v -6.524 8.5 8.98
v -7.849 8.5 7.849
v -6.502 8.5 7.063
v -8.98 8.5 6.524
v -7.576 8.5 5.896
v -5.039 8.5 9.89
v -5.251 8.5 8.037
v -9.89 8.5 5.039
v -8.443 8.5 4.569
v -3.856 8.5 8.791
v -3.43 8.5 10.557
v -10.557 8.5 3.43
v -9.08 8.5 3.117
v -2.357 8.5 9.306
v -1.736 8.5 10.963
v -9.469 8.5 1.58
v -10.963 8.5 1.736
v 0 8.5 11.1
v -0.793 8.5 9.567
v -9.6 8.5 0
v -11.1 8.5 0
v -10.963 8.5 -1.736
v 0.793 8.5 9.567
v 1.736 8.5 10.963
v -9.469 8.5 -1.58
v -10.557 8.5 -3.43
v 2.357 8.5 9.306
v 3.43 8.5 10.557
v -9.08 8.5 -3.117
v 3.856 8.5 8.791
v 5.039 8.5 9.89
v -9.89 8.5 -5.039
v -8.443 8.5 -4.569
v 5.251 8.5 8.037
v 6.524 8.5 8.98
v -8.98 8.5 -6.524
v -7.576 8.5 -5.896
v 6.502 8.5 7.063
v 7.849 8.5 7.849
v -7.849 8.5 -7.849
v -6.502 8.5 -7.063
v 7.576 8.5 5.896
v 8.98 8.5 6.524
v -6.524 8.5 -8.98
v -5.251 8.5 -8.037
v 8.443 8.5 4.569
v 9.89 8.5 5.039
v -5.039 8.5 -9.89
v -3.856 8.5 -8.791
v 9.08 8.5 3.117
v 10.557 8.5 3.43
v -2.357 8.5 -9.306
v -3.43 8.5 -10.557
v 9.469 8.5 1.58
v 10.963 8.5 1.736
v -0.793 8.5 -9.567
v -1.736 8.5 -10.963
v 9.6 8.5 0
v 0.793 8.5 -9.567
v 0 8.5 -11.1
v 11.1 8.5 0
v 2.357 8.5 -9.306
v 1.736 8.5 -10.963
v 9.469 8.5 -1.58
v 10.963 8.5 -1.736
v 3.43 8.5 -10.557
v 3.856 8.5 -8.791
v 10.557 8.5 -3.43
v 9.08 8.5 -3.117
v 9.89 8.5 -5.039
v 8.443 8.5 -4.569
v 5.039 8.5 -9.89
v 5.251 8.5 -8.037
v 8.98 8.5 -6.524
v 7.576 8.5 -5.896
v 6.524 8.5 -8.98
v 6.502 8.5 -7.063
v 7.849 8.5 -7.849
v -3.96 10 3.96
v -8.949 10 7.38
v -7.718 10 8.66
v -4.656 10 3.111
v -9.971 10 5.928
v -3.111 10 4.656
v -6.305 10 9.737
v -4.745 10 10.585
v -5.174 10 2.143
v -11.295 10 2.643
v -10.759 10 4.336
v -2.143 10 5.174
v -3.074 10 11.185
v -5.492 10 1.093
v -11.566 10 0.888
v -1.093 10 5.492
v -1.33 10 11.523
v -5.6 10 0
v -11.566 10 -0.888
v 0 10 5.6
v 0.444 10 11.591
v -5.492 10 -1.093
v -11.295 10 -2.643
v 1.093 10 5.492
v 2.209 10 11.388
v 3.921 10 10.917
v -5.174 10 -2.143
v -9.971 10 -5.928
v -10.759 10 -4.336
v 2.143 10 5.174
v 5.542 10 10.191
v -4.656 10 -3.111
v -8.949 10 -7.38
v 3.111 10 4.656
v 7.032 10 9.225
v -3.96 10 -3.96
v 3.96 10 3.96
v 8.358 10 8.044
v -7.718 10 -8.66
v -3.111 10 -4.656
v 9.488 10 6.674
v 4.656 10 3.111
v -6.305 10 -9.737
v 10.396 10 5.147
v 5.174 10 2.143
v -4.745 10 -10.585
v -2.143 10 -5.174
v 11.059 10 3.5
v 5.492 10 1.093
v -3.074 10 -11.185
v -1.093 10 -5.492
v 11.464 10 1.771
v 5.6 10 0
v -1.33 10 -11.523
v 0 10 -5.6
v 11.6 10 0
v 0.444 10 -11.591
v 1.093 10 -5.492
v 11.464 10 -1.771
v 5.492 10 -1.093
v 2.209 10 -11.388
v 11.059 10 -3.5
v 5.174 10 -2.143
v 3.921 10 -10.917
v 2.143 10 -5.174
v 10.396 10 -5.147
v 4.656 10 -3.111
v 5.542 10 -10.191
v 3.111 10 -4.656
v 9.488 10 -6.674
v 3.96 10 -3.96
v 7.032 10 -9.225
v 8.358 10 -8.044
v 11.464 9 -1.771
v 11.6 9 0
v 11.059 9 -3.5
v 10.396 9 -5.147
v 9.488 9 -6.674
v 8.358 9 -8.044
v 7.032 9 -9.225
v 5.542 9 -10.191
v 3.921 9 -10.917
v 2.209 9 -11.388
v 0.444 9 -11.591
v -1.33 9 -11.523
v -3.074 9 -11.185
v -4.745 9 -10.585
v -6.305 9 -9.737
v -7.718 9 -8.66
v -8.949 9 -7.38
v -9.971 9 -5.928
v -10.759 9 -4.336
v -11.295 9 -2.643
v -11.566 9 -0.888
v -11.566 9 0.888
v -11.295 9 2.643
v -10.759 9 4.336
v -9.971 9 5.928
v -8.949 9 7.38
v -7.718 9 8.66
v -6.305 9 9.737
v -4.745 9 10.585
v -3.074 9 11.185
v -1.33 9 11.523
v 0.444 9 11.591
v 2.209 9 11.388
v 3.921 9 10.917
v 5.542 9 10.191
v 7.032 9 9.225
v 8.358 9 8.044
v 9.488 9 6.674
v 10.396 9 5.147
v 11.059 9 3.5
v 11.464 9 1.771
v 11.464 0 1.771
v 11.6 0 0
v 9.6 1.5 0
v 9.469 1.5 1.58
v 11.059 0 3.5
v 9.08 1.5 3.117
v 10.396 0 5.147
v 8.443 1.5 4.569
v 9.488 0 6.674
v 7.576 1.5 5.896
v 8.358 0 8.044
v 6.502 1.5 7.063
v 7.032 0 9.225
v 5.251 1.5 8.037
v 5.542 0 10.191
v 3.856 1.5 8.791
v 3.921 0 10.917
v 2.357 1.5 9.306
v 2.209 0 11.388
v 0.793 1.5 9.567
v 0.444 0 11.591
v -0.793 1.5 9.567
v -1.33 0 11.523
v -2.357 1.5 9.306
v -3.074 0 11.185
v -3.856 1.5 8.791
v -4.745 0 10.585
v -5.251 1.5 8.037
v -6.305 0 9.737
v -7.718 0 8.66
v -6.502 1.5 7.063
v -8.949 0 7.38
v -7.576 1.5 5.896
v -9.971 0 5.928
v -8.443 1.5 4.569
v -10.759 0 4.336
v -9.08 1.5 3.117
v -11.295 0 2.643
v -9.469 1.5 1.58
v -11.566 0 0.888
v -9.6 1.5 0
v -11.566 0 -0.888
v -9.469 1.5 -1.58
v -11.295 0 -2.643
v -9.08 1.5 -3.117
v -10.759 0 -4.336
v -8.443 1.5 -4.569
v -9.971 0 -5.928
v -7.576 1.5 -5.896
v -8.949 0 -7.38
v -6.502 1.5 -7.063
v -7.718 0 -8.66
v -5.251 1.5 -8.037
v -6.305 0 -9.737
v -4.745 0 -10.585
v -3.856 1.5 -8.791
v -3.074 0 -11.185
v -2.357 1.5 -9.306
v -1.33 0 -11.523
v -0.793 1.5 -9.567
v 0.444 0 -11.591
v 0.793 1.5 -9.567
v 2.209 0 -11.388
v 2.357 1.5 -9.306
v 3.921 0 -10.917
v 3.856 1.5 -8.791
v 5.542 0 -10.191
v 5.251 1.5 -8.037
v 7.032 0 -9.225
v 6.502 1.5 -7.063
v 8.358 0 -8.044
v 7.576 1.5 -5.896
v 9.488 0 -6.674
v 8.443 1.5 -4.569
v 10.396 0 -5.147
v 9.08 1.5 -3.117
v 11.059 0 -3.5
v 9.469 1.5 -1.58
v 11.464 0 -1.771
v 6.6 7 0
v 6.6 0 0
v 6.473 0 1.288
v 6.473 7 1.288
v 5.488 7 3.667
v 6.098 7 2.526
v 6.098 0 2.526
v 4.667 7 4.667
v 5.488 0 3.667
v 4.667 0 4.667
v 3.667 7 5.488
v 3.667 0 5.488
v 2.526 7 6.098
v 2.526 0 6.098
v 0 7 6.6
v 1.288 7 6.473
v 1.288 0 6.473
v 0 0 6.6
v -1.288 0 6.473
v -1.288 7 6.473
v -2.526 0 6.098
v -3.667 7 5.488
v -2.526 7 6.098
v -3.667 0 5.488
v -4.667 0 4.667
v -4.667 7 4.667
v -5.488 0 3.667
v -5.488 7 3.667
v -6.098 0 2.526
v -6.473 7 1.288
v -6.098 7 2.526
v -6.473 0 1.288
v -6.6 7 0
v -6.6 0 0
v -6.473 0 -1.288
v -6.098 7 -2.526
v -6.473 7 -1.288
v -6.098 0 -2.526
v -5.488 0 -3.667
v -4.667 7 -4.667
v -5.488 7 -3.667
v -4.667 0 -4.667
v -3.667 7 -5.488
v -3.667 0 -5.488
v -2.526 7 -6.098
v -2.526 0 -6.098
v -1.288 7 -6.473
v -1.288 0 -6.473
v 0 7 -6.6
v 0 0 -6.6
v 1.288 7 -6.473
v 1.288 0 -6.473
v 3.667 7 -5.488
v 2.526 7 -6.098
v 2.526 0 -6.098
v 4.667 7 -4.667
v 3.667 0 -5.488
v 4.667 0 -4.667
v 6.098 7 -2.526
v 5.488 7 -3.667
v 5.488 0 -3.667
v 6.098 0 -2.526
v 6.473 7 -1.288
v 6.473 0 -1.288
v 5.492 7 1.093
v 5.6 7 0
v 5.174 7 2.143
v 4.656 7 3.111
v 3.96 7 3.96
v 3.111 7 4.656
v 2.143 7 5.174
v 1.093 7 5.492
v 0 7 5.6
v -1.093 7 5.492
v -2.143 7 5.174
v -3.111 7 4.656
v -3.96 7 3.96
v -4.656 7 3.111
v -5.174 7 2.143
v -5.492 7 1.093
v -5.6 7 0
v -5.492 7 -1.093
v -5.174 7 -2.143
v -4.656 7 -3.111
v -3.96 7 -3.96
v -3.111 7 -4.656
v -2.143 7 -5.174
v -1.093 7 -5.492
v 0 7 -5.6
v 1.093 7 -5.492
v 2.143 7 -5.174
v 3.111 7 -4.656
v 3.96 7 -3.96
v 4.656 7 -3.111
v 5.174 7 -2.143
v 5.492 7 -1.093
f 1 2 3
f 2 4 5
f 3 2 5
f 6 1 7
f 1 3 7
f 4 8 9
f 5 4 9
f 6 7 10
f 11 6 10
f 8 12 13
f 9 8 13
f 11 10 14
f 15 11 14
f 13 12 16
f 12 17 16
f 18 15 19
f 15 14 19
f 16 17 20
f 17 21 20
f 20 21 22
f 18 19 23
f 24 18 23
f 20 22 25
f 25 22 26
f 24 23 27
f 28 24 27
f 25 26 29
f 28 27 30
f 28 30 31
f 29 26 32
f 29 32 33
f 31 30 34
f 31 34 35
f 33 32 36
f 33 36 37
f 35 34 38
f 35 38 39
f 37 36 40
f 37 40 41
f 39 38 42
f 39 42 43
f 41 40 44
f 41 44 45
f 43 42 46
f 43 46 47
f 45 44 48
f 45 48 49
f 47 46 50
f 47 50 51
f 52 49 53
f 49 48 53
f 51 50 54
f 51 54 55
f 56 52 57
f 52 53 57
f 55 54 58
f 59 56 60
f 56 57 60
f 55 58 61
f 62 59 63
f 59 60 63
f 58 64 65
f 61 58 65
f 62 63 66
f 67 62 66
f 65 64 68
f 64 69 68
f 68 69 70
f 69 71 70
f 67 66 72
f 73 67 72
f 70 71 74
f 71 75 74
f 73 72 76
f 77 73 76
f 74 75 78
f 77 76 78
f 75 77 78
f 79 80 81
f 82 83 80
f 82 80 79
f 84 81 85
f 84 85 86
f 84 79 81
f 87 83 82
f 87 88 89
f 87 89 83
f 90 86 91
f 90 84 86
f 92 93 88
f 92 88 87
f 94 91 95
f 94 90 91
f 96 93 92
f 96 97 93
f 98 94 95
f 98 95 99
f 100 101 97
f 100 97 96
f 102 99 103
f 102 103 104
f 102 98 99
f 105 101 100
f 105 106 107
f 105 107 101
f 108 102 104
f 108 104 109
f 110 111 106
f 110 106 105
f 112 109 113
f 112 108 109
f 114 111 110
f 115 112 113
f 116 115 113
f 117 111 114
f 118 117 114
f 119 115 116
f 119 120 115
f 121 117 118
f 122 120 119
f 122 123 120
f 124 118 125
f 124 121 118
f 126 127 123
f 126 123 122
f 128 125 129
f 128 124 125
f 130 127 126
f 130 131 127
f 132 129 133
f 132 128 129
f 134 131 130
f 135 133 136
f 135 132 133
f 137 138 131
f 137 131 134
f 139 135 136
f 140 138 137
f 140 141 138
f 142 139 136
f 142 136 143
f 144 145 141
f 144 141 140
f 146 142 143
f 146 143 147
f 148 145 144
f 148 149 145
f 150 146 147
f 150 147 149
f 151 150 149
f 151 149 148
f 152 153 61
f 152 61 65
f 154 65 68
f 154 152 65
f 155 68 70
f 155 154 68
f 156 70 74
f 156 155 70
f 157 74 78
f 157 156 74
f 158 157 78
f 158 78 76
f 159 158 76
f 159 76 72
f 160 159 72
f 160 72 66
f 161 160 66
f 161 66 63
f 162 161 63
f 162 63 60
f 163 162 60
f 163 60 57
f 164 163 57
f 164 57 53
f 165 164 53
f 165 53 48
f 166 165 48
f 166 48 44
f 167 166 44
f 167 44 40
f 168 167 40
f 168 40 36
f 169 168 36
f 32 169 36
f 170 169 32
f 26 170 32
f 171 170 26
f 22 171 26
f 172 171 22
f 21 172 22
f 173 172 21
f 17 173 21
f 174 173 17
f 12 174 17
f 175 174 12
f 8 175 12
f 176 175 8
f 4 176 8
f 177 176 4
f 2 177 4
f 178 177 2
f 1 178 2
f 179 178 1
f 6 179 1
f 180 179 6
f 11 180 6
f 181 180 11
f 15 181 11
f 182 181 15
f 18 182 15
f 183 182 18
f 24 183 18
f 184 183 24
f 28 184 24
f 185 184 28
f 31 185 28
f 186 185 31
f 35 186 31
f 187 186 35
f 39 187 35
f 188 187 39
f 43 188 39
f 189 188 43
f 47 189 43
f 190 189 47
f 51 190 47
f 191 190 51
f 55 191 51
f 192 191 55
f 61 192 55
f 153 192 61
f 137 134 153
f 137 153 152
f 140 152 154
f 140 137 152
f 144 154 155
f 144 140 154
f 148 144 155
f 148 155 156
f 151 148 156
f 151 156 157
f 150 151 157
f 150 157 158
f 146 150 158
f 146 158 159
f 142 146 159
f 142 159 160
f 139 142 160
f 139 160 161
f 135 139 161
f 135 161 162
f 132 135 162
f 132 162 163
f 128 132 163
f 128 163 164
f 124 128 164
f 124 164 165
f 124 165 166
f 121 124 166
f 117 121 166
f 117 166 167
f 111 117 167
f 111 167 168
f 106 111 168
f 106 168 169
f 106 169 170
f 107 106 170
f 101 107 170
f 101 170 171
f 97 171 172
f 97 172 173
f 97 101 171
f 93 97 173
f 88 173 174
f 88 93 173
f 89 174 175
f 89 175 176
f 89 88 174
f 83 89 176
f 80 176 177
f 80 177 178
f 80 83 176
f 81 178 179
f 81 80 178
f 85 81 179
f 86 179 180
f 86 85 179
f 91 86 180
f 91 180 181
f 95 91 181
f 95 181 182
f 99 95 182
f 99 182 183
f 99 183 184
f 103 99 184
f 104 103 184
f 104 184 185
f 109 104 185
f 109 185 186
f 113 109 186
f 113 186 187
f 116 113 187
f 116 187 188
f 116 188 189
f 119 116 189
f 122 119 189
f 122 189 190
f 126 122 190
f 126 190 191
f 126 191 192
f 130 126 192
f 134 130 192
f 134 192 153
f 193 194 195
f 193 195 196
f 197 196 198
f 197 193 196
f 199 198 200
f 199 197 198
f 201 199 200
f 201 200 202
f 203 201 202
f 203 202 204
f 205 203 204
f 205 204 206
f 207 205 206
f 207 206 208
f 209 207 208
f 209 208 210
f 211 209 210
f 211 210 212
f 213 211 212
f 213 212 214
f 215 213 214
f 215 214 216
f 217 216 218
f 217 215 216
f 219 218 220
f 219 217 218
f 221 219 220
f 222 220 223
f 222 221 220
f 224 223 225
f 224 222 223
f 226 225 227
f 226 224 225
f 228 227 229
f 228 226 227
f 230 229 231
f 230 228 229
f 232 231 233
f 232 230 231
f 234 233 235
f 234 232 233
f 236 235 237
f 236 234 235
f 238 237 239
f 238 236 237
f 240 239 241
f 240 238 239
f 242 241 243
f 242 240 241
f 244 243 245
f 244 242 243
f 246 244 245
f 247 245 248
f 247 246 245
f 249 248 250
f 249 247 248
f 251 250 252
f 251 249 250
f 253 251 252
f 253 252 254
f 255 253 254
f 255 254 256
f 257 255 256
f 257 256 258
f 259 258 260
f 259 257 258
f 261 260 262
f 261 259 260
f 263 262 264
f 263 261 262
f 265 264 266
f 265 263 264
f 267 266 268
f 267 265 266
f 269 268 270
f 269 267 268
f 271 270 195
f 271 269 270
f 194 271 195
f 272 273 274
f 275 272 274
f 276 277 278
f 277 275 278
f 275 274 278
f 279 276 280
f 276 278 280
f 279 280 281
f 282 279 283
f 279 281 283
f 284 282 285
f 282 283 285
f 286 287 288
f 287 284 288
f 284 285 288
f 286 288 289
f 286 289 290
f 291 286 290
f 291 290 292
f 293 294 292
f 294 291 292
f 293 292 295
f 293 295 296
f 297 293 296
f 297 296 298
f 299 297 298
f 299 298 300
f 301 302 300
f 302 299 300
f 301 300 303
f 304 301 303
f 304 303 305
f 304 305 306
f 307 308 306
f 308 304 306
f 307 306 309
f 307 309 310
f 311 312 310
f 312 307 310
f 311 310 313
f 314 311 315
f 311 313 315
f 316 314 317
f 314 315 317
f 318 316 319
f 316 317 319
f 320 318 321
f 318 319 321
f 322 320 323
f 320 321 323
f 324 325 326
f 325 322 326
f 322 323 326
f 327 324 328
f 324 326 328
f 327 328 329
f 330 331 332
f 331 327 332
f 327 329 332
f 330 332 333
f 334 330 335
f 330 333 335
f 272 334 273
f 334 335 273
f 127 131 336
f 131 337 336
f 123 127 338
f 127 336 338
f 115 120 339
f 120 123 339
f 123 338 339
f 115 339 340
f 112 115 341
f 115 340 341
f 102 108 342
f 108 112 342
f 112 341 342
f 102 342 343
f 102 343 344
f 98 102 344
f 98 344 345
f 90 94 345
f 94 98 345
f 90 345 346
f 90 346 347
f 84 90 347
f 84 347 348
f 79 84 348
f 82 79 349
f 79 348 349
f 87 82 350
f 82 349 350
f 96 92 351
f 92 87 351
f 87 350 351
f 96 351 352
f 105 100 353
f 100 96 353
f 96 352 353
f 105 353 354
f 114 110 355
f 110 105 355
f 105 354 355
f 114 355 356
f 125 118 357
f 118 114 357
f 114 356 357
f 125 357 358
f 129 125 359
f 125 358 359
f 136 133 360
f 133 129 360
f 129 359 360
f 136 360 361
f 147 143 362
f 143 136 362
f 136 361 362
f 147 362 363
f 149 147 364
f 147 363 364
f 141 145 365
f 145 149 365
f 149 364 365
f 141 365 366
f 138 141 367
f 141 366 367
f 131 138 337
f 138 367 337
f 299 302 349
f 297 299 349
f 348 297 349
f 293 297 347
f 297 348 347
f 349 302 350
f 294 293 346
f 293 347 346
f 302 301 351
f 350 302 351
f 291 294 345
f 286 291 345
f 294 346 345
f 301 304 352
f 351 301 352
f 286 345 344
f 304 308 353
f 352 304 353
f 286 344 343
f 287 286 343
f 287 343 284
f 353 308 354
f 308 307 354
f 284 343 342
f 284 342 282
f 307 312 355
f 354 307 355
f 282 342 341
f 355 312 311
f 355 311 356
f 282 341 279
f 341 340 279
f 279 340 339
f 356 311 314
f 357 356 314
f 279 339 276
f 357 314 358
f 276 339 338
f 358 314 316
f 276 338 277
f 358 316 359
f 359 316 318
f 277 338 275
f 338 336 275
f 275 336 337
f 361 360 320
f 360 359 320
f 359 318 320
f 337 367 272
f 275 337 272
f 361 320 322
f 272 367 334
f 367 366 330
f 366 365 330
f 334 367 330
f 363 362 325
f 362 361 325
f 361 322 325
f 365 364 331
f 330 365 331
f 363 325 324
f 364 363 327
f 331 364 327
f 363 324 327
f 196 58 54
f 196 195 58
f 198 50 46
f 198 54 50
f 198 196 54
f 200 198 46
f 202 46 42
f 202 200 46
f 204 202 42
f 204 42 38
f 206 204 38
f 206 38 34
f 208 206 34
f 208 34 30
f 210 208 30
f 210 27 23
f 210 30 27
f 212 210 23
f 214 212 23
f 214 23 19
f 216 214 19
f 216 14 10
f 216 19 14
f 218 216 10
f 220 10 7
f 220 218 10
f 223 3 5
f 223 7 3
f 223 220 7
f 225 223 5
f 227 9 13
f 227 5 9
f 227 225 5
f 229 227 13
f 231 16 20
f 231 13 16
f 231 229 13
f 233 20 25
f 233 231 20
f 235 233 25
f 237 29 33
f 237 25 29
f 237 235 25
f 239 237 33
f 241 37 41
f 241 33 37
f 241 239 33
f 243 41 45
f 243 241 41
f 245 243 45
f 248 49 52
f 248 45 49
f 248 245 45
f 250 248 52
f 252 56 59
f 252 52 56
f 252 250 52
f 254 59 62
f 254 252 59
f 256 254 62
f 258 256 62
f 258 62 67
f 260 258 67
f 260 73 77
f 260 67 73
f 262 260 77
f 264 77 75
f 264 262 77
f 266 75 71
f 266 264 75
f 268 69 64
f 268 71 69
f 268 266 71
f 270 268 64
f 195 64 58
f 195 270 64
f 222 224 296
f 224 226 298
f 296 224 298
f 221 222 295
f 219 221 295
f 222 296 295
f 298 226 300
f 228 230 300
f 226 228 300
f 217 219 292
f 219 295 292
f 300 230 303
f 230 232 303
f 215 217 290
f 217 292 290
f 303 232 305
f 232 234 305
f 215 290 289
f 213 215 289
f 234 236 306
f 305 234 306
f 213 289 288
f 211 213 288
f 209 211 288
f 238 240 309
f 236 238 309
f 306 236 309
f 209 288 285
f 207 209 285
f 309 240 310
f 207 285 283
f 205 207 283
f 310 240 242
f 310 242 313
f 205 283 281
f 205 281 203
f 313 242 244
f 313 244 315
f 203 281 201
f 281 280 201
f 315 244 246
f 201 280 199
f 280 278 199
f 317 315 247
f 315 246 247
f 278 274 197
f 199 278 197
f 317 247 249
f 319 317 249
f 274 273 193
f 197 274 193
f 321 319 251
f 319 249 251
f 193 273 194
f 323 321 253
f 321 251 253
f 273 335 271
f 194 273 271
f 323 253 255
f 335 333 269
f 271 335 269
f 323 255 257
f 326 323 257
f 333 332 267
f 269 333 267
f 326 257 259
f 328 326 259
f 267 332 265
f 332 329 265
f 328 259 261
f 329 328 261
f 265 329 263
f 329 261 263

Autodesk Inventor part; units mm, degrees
ref_plane "YZ Plane" through (0, 0, 0) normal (1, 0, 0) x (0, 1, 0)
ref_plane "XZ Plane" through (0, 0, 0) normal (0, 1, 0) x (-1, 0, 0)
ref_plane "XY Plane" through (0, 0, 0) normal (0, 0, 1) x (1, 0, 0)
sketch "Sketch1" plane through (0, 0, 0) normal (0, 0, 1) x (1, 0, 0)
  line L0 (6.6, 0) -> (11.6, 0)
  line L1 (11.6, 0) -> (11.6, 10) construction
  line L2 (11.6, 10) -> (6.6, 10)
  line L3 (6.6, 10) -> (6.6, 0)
  line L4 (0, 0) -> (0, 8.5122) construction
  line L5 (9.6, 8.5) -> (9.6, 1.5)
  line L6 (9.6, 8.5) -> (11.1, 8.5)
  line L7 (11.1, 8.5) -> (11.6, 9)
  line L8 (11.6, 0) -> (9.6, 1.5)
  line L9 (11.6, 9) -> (11.6, 10)
  line L10 (6.6, 10) -> (5.6, 10)
  line L11 (5.6, 10) -> (5.6, 7)
  line L12 (5.6, 7) -> (6.6, 7)
  line L13 (6.6, 7) -> (6.6, 10)
  point P0 (11.6, 0.6699)
  point P1 (11.6, 5)
  point P2 (15.2143, 7.5754)
  point P3 (15.2143, 2.4246)
  point P4 (9.6, 5)
  point P5 (17.7886, 0.302)
  point P6 (6.6, 5)
  dimension "d6" = 10
  dimension "d7" = 6.6
  dimension "d14" = 5
  dimension "d17" = 7
  dimension "d18" = 1.5
  dimension "d19" = 135
  dimension "d20" = 2
  dimension "d21" = 1
  dimension "d22" = 3
revolve "Revolution1" add sketch "Sketch1" angle 360 about axis through (0, 0, 0) along (0, 1, 0)
properties part number "pully10mmx20mmx12mm"
